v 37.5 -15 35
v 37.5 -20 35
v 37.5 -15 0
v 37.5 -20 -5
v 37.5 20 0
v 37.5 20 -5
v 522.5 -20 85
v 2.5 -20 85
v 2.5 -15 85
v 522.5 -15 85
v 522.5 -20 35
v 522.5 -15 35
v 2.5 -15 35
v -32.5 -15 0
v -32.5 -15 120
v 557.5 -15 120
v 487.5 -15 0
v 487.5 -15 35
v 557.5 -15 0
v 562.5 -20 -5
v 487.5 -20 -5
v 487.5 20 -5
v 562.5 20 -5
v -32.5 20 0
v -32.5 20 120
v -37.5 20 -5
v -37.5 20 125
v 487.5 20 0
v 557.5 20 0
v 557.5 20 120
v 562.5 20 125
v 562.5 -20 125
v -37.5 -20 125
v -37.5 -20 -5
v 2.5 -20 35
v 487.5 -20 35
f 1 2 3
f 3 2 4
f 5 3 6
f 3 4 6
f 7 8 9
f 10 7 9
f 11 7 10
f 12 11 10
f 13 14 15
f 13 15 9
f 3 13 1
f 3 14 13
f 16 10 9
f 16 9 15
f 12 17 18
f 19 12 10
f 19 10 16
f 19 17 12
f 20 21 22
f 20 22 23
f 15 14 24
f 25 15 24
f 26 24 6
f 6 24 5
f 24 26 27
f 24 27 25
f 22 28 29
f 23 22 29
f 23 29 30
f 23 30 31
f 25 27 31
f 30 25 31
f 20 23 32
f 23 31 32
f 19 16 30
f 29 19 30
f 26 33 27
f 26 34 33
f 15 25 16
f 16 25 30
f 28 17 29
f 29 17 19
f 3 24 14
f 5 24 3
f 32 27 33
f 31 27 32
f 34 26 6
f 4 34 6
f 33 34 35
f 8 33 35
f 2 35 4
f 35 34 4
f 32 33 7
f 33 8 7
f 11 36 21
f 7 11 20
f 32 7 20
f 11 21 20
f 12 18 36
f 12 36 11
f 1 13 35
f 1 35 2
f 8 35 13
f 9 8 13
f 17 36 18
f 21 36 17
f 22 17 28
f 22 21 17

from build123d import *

# Parameters (mm, degrees)
F1_DEPTH  = 5
F3_DEPTH  = 120
F4_W      = 600
F4_H      = 40
F5_DEPTH  = 5
F7_DEPTH  = 120
F8_W      = 75
F8_H      = 40
F9_DEPTH  = 5
F10_W     = 5
F10_H     = 35
F11_DEPTH = 520
F12_W     = 35
F12_H     = 5
F13_DEPTH = 35
F14_W     = 35
F14_H     = 5
F15_DEPTH = 35


with BuildPart() as f1:
    # F0 (on Top) → F1 (new body)
    with BuildSketch(Plane.XY):
        Polygon((0, -20), (37.5, -20), (37.5, 20), (-37.5, 20), (-37.5, -20), align=None)
    extrude(amount=-F1_DEPTH)

    # F2 (on face) → F3 (join)
    with BuildSketch(Plane.XY):
        Polygon((-32.5, 20), (-37.5, 20), (-37.5, -20), (2.5, -20), (2.5, -15), (-32.5, -15), align=None)
    extrude(amount=F3_DEPTH)

    # F4 (on face) → F5 (join)
    with BuildSketch(Plane.XY.offset(120)):
        with Locations((262.5, 0)):
            Rectangle(F4_W, F4_H)
    extrude(amount=F5_DEPTH)

    # F6 (on face) → F7 (join)
    with BuildSketch(Plane(origin=(0, 0, 120), x_dir=(1, 0, 0), z_dir=(0, 0, -1))):
        Polygon((557.5, -20), (562.5, -20), (562.5, 20), (522.5, 20), (522.5, 15), (557.5, 15), align=None)
    extrude(amount=F7_DEPTH)

    # F8 (on face) → F9 (join)
    with BuildSketch(Plane(origin=(0, 0, 0), x_dir=(1, 0, 0), z_dir=(0, 0, -1))):
        with Locations((525, 0)):
            Rectangle(F8_W, F8_H)
    extrude(amount=F9_DEPTH)

    # F10 (on face) → F11 (join)
    with BuildSketch(Plane.YZ.offset(2.5)):
        with Locations((-17.5, 102.5)):
            Rectangle(F10_W, F10_H)
    extrude(amount=F11_DEPTH)

    # F12 (on face) → F13 (join)
    with BuildSketch(Plane.XY):
        with Locations((20, -17.5)):
            Rectangle(F12_W, F12_H)
    extrude(amount=F13_DEPTH)

    # F14 (on face) → F15 (join)
    with BuildSketch(Plane.XY):
        with Locations((505, -17.5)):
            Rectangle(F14_W, F14_H)
    extrude(amount=F15_DEPTH)


solid = f1.part
